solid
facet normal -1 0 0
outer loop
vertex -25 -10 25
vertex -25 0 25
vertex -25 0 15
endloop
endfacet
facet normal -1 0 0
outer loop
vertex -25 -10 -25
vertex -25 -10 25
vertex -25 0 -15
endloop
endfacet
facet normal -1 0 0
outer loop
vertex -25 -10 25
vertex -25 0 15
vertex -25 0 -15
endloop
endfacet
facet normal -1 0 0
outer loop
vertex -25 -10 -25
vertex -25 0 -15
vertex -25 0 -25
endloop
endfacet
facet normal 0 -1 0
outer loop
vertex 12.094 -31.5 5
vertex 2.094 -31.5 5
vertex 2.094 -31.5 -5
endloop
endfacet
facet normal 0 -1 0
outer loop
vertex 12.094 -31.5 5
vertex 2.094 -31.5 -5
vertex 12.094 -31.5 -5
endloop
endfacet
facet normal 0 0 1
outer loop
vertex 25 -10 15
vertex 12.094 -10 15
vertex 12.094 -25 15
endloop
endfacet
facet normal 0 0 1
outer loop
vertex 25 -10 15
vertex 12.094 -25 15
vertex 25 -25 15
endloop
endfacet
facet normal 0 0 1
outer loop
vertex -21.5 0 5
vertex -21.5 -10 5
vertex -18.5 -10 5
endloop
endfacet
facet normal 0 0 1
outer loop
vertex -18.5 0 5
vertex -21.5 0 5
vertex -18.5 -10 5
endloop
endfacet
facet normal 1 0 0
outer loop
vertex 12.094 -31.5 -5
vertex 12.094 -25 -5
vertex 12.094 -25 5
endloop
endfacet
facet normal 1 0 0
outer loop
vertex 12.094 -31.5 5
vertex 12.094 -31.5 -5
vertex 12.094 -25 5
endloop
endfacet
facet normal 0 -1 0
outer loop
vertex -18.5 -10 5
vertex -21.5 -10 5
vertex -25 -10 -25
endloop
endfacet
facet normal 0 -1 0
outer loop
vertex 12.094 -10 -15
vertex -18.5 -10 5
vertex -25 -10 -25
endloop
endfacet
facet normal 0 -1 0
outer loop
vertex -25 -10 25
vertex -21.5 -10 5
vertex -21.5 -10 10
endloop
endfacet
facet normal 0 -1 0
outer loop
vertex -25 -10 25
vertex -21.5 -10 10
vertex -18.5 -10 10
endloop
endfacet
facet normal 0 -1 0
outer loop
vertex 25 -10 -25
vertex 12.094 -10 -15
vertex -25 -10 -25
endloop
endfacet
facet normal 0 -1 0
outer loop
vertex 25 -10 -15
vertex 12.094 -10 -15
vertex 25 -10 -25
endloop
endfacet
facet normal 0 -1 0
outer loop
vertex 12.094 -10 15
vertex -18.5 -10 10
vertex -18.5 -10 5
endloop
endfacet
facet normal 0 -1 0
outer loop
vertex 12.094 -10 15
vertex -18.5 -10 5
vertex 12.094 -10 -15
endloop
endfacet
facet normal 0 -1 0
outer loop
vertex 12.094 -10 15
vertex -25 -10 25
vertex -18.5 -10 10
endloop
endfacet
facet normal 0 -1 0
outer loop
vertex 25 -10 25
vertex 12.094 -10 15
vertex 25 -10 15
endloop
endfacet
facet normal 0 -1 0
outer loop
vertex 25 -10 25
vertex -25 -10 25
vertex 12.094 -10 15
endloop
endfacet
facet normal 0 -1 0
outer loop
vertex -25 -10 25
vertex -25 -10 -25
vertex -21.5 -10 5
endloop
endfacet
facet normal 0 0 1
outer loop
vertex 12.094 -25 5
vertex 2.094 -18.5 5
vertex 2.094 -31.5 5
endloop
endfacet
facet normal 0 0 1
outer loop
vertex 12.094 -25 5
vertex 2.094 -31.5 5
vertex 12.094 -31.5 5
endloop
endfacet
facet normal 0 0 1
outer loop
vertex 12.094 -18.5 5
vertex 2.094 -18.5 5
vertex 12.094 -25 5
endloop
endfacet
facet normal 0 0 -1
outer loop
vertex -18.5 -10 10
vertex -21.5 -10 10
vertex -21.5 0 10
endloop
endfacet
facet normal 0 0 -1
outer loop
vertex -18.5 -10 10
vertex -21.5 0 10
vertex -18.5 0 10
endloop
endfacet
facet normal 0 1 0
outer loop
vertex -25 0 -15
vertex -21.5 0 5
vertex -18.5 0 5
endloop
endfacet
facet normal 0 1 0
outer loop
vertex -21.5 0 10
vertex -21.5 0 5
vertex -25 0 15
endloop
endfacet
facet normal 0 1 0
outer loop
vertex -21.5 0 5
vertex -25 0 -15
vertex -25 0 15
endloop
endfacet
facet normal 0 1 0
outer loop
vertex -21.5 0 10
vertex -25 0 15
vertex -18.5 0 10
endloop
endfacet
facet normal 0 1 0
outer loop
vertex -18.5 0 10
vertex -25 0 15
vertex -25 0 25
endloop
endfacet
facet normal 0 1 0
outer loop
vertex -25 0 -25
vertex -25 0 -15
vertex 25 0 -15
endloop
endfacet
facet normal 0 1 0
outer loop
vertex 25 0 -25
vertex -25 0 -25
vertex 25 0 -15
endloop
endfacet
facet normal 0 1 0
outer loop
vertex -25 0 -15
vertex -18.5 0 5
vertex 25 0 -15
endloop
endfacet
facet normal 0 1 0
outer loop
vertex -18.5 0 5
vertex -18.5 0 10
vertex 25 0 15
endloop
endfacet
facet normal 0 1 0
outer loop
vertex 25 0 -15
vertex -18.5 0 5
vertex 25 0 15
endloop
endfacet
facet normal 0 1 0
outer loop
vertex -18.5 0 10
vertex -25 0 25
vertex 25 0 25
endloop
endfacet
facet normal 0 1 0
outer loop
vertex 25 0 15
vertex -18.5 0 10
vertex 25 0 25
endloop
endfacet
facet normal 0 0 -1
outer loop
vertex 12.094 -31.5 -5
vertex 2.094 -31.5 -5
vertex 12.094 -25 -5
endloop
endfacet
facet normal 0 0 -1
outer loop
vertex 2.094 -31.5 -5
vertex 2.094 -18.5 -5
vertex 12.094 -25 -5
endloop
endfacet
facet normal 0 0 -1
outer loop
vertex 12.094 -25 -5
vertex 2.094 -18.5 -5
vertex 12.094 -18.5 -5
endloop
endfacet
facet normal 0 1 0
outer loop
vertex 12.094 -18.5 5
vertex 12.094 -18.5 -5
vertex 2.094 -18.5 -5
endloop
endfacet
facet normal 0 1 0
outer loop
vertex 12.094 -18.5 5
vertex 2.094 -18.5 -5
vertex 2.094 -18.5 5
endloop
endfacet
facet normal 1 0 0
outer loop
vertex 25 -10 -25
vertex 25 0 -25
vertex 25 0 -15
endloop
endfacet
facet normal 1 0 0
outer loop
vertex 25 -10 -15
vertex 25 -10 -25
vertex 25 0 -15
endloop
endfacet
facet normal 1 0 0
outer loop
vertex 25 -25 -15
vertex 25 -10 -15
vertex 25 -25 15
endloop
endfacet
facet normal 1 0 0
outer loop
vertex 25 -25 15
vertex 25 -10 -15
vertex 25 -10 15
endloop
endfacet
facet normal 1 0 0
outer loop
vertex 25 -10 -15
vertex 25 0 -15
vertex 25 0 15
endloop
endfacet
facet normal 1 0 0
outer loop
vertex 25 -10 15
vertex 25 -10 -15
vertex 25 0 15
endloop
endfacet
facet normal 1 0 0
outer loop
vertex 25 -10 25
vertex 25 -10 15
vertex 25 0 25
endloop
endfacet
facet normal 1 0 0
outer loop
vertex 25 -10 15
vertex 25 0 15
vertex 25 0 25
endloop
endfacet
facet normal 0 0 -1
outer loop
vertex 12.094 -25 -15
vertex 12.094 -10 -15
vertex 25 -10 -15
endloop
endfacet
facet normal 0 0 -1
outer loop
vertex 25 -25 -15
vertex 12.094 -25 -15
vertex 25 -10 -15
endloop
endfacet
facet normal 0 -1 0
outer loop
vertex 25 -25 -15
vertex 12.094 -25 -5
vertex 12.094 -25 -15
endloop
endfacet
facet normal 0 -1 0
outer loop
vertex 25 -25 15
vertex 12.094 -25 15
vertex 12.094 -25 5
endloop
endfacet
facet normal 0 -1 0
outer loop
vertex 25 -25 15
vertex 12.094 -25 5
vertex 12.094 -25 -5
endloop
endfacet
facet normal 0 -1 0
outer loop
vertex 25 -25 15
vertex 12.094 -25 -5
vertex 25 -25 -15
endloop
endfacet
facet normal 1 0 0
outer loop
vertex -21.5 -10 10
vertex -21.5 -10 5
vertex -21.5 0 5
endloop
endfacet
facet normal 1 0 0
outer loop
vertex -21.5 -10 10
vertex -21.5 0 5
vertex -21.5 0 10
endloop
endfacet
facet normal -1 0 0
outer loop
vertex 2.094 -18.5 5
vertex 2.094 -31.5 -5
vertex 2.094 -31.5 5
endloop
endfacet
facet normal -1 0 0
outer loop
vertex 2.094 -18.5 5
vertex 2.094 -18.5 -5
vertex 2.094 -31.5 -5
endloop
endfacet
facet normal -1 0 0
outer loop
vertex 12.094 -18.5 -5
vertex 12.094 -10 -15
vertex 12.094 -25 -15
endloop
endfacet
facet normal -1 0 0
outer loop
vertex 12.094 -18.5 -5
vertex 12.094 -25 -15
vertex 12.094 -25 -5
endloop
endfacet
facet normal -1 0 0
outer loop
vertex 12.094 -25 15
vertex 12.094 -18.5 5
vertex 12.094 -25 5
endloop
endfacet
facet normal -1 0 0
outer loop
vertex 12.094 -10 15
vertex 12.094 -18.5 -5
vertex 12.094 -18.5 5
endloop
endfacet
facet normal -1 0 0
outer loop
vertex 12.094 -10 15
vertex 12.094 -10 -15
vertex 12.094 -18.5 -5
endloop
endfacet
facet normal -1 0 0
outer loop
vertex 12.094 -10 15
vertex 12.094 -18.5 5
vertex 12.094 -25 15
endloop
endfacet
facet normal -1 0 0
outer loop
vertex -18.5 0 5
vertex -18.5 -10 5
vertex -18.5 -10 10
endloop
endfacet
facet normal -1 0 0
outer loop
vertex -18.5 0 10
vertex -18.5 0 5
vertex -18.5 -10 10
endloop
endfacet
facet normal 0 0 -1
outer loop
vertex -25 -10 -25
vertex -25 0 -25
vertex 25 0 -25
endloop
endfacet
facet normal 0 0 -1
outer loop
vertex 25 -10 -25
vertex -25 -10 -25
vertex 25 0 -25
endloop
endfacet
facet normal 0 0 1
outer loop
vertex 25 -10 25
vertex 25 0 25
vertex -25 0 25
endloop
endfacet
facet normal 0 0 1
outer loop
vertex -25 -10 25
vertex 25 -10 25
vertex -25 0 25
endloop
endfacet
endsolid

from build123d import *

# Parameters (mm, degrees)
F0_W      = 12.9061160609
F0_H      = 30
F1_DEPTH  = 25
F2_DEPTH  = 10
F3_W      = 6.5
F3_H      = 10
F4_DEPTH  = 10
F5_W      = 6.5
F5_H      = 10
F6_DEPTH  = 10
F7_W      = 15
F7_H      = 30
F8_DEPTH  = 22.9061160609
F9_W      = 10
F9_H      = 10
F10_DEPTH = 6.5
F11_W     = 3
F11_H     = 5
F12_DEPTH = 10


with BuildPart() as f1:
    # F0 (on Front) → F1 (new body)
    with BuildSketch(Plane.XZ):
        with Locations((18.5469419695, 0)):
            Rectangle(F0_W, F0_H)
    extrude(amount=F1_DEPTH)



with BuildPart() as f1b:
    # F0 (on Front) → F1, piece 2 (new body)
    with BuildSketch(Plane.XZ):
        with Locations((-18.5469419695, 0)):
            Rectangle(F0_W, F0_H)
    extrude(amount=F1_DEPTH)


with BuildPart() as f1_1:
    add(f1.part)

    add(f1b.part)  # F2 merges F1b
    # F0 (on Front) → F2 (join)
    with BuildSketch(Plane.XZ):
        Polygon((25, 15), (25, 25), (-25, 25), (-25, 15), (-12.0938839391, 15), (-12.0938839391, -15), (-25, -15), (-25, -25), (25, -25), (25, -15), (12.0938839391, -15), (12.0938839391, 15), align=None)
    extrude(amount=F2_DEPTH)

    # F3 (on face) → F4 (join)
    with BuildSketch(Plane.YZ.offset(-12.0938839391)):
        with Locations((-21.75, 0)):
            Rectangle(F3_W, F3_H)
    extrude(amount=F4_DEPTH)

    # F5 (on face) → F6 (join)
    with BuildSketch(Plane(origin=(12.0938839391, 0, 0), x_dir=(0, -1, 0), z_dir=(-1, 0, 0))):
        with Locations((21.75, 0)):
            Rectangle(F5_W, F5_H)
    extrude(amount=F6_DEPTH)

    # F7 (on face) → F8 (cut, through all)
    with BuildSketch(Plane(origin=(-25, 0, 0), x_dir=(0, -1, 0), z_dir=(-1, 0, 0))):
        with Locations((17.5, 0)):
            Rectangle(F7_W, F7_H)
    extrude(amount=-F8_DEPTH, mode=Mode.SUBTRACT)

    # F9 (on face) → F10 (join)
    with BuildSketch(Plane.XZ.offset(25)):
        with Locations((7.0938839391, 0)):
            Rectangle(F9_W, F9_H)
    extrude(amount=F10_DEPTH)

    # F11 (on face) → F12 (cut)
    with BuildSketch(Plane.XZ.offset(10)):
        with Locations((-20, 7.5)):
            Rectangle(F11_W, F11_H)
    extrude(amount=-F12_DEPTH, mode=Mode.SUBTRACT)


solid = f1_1.part
